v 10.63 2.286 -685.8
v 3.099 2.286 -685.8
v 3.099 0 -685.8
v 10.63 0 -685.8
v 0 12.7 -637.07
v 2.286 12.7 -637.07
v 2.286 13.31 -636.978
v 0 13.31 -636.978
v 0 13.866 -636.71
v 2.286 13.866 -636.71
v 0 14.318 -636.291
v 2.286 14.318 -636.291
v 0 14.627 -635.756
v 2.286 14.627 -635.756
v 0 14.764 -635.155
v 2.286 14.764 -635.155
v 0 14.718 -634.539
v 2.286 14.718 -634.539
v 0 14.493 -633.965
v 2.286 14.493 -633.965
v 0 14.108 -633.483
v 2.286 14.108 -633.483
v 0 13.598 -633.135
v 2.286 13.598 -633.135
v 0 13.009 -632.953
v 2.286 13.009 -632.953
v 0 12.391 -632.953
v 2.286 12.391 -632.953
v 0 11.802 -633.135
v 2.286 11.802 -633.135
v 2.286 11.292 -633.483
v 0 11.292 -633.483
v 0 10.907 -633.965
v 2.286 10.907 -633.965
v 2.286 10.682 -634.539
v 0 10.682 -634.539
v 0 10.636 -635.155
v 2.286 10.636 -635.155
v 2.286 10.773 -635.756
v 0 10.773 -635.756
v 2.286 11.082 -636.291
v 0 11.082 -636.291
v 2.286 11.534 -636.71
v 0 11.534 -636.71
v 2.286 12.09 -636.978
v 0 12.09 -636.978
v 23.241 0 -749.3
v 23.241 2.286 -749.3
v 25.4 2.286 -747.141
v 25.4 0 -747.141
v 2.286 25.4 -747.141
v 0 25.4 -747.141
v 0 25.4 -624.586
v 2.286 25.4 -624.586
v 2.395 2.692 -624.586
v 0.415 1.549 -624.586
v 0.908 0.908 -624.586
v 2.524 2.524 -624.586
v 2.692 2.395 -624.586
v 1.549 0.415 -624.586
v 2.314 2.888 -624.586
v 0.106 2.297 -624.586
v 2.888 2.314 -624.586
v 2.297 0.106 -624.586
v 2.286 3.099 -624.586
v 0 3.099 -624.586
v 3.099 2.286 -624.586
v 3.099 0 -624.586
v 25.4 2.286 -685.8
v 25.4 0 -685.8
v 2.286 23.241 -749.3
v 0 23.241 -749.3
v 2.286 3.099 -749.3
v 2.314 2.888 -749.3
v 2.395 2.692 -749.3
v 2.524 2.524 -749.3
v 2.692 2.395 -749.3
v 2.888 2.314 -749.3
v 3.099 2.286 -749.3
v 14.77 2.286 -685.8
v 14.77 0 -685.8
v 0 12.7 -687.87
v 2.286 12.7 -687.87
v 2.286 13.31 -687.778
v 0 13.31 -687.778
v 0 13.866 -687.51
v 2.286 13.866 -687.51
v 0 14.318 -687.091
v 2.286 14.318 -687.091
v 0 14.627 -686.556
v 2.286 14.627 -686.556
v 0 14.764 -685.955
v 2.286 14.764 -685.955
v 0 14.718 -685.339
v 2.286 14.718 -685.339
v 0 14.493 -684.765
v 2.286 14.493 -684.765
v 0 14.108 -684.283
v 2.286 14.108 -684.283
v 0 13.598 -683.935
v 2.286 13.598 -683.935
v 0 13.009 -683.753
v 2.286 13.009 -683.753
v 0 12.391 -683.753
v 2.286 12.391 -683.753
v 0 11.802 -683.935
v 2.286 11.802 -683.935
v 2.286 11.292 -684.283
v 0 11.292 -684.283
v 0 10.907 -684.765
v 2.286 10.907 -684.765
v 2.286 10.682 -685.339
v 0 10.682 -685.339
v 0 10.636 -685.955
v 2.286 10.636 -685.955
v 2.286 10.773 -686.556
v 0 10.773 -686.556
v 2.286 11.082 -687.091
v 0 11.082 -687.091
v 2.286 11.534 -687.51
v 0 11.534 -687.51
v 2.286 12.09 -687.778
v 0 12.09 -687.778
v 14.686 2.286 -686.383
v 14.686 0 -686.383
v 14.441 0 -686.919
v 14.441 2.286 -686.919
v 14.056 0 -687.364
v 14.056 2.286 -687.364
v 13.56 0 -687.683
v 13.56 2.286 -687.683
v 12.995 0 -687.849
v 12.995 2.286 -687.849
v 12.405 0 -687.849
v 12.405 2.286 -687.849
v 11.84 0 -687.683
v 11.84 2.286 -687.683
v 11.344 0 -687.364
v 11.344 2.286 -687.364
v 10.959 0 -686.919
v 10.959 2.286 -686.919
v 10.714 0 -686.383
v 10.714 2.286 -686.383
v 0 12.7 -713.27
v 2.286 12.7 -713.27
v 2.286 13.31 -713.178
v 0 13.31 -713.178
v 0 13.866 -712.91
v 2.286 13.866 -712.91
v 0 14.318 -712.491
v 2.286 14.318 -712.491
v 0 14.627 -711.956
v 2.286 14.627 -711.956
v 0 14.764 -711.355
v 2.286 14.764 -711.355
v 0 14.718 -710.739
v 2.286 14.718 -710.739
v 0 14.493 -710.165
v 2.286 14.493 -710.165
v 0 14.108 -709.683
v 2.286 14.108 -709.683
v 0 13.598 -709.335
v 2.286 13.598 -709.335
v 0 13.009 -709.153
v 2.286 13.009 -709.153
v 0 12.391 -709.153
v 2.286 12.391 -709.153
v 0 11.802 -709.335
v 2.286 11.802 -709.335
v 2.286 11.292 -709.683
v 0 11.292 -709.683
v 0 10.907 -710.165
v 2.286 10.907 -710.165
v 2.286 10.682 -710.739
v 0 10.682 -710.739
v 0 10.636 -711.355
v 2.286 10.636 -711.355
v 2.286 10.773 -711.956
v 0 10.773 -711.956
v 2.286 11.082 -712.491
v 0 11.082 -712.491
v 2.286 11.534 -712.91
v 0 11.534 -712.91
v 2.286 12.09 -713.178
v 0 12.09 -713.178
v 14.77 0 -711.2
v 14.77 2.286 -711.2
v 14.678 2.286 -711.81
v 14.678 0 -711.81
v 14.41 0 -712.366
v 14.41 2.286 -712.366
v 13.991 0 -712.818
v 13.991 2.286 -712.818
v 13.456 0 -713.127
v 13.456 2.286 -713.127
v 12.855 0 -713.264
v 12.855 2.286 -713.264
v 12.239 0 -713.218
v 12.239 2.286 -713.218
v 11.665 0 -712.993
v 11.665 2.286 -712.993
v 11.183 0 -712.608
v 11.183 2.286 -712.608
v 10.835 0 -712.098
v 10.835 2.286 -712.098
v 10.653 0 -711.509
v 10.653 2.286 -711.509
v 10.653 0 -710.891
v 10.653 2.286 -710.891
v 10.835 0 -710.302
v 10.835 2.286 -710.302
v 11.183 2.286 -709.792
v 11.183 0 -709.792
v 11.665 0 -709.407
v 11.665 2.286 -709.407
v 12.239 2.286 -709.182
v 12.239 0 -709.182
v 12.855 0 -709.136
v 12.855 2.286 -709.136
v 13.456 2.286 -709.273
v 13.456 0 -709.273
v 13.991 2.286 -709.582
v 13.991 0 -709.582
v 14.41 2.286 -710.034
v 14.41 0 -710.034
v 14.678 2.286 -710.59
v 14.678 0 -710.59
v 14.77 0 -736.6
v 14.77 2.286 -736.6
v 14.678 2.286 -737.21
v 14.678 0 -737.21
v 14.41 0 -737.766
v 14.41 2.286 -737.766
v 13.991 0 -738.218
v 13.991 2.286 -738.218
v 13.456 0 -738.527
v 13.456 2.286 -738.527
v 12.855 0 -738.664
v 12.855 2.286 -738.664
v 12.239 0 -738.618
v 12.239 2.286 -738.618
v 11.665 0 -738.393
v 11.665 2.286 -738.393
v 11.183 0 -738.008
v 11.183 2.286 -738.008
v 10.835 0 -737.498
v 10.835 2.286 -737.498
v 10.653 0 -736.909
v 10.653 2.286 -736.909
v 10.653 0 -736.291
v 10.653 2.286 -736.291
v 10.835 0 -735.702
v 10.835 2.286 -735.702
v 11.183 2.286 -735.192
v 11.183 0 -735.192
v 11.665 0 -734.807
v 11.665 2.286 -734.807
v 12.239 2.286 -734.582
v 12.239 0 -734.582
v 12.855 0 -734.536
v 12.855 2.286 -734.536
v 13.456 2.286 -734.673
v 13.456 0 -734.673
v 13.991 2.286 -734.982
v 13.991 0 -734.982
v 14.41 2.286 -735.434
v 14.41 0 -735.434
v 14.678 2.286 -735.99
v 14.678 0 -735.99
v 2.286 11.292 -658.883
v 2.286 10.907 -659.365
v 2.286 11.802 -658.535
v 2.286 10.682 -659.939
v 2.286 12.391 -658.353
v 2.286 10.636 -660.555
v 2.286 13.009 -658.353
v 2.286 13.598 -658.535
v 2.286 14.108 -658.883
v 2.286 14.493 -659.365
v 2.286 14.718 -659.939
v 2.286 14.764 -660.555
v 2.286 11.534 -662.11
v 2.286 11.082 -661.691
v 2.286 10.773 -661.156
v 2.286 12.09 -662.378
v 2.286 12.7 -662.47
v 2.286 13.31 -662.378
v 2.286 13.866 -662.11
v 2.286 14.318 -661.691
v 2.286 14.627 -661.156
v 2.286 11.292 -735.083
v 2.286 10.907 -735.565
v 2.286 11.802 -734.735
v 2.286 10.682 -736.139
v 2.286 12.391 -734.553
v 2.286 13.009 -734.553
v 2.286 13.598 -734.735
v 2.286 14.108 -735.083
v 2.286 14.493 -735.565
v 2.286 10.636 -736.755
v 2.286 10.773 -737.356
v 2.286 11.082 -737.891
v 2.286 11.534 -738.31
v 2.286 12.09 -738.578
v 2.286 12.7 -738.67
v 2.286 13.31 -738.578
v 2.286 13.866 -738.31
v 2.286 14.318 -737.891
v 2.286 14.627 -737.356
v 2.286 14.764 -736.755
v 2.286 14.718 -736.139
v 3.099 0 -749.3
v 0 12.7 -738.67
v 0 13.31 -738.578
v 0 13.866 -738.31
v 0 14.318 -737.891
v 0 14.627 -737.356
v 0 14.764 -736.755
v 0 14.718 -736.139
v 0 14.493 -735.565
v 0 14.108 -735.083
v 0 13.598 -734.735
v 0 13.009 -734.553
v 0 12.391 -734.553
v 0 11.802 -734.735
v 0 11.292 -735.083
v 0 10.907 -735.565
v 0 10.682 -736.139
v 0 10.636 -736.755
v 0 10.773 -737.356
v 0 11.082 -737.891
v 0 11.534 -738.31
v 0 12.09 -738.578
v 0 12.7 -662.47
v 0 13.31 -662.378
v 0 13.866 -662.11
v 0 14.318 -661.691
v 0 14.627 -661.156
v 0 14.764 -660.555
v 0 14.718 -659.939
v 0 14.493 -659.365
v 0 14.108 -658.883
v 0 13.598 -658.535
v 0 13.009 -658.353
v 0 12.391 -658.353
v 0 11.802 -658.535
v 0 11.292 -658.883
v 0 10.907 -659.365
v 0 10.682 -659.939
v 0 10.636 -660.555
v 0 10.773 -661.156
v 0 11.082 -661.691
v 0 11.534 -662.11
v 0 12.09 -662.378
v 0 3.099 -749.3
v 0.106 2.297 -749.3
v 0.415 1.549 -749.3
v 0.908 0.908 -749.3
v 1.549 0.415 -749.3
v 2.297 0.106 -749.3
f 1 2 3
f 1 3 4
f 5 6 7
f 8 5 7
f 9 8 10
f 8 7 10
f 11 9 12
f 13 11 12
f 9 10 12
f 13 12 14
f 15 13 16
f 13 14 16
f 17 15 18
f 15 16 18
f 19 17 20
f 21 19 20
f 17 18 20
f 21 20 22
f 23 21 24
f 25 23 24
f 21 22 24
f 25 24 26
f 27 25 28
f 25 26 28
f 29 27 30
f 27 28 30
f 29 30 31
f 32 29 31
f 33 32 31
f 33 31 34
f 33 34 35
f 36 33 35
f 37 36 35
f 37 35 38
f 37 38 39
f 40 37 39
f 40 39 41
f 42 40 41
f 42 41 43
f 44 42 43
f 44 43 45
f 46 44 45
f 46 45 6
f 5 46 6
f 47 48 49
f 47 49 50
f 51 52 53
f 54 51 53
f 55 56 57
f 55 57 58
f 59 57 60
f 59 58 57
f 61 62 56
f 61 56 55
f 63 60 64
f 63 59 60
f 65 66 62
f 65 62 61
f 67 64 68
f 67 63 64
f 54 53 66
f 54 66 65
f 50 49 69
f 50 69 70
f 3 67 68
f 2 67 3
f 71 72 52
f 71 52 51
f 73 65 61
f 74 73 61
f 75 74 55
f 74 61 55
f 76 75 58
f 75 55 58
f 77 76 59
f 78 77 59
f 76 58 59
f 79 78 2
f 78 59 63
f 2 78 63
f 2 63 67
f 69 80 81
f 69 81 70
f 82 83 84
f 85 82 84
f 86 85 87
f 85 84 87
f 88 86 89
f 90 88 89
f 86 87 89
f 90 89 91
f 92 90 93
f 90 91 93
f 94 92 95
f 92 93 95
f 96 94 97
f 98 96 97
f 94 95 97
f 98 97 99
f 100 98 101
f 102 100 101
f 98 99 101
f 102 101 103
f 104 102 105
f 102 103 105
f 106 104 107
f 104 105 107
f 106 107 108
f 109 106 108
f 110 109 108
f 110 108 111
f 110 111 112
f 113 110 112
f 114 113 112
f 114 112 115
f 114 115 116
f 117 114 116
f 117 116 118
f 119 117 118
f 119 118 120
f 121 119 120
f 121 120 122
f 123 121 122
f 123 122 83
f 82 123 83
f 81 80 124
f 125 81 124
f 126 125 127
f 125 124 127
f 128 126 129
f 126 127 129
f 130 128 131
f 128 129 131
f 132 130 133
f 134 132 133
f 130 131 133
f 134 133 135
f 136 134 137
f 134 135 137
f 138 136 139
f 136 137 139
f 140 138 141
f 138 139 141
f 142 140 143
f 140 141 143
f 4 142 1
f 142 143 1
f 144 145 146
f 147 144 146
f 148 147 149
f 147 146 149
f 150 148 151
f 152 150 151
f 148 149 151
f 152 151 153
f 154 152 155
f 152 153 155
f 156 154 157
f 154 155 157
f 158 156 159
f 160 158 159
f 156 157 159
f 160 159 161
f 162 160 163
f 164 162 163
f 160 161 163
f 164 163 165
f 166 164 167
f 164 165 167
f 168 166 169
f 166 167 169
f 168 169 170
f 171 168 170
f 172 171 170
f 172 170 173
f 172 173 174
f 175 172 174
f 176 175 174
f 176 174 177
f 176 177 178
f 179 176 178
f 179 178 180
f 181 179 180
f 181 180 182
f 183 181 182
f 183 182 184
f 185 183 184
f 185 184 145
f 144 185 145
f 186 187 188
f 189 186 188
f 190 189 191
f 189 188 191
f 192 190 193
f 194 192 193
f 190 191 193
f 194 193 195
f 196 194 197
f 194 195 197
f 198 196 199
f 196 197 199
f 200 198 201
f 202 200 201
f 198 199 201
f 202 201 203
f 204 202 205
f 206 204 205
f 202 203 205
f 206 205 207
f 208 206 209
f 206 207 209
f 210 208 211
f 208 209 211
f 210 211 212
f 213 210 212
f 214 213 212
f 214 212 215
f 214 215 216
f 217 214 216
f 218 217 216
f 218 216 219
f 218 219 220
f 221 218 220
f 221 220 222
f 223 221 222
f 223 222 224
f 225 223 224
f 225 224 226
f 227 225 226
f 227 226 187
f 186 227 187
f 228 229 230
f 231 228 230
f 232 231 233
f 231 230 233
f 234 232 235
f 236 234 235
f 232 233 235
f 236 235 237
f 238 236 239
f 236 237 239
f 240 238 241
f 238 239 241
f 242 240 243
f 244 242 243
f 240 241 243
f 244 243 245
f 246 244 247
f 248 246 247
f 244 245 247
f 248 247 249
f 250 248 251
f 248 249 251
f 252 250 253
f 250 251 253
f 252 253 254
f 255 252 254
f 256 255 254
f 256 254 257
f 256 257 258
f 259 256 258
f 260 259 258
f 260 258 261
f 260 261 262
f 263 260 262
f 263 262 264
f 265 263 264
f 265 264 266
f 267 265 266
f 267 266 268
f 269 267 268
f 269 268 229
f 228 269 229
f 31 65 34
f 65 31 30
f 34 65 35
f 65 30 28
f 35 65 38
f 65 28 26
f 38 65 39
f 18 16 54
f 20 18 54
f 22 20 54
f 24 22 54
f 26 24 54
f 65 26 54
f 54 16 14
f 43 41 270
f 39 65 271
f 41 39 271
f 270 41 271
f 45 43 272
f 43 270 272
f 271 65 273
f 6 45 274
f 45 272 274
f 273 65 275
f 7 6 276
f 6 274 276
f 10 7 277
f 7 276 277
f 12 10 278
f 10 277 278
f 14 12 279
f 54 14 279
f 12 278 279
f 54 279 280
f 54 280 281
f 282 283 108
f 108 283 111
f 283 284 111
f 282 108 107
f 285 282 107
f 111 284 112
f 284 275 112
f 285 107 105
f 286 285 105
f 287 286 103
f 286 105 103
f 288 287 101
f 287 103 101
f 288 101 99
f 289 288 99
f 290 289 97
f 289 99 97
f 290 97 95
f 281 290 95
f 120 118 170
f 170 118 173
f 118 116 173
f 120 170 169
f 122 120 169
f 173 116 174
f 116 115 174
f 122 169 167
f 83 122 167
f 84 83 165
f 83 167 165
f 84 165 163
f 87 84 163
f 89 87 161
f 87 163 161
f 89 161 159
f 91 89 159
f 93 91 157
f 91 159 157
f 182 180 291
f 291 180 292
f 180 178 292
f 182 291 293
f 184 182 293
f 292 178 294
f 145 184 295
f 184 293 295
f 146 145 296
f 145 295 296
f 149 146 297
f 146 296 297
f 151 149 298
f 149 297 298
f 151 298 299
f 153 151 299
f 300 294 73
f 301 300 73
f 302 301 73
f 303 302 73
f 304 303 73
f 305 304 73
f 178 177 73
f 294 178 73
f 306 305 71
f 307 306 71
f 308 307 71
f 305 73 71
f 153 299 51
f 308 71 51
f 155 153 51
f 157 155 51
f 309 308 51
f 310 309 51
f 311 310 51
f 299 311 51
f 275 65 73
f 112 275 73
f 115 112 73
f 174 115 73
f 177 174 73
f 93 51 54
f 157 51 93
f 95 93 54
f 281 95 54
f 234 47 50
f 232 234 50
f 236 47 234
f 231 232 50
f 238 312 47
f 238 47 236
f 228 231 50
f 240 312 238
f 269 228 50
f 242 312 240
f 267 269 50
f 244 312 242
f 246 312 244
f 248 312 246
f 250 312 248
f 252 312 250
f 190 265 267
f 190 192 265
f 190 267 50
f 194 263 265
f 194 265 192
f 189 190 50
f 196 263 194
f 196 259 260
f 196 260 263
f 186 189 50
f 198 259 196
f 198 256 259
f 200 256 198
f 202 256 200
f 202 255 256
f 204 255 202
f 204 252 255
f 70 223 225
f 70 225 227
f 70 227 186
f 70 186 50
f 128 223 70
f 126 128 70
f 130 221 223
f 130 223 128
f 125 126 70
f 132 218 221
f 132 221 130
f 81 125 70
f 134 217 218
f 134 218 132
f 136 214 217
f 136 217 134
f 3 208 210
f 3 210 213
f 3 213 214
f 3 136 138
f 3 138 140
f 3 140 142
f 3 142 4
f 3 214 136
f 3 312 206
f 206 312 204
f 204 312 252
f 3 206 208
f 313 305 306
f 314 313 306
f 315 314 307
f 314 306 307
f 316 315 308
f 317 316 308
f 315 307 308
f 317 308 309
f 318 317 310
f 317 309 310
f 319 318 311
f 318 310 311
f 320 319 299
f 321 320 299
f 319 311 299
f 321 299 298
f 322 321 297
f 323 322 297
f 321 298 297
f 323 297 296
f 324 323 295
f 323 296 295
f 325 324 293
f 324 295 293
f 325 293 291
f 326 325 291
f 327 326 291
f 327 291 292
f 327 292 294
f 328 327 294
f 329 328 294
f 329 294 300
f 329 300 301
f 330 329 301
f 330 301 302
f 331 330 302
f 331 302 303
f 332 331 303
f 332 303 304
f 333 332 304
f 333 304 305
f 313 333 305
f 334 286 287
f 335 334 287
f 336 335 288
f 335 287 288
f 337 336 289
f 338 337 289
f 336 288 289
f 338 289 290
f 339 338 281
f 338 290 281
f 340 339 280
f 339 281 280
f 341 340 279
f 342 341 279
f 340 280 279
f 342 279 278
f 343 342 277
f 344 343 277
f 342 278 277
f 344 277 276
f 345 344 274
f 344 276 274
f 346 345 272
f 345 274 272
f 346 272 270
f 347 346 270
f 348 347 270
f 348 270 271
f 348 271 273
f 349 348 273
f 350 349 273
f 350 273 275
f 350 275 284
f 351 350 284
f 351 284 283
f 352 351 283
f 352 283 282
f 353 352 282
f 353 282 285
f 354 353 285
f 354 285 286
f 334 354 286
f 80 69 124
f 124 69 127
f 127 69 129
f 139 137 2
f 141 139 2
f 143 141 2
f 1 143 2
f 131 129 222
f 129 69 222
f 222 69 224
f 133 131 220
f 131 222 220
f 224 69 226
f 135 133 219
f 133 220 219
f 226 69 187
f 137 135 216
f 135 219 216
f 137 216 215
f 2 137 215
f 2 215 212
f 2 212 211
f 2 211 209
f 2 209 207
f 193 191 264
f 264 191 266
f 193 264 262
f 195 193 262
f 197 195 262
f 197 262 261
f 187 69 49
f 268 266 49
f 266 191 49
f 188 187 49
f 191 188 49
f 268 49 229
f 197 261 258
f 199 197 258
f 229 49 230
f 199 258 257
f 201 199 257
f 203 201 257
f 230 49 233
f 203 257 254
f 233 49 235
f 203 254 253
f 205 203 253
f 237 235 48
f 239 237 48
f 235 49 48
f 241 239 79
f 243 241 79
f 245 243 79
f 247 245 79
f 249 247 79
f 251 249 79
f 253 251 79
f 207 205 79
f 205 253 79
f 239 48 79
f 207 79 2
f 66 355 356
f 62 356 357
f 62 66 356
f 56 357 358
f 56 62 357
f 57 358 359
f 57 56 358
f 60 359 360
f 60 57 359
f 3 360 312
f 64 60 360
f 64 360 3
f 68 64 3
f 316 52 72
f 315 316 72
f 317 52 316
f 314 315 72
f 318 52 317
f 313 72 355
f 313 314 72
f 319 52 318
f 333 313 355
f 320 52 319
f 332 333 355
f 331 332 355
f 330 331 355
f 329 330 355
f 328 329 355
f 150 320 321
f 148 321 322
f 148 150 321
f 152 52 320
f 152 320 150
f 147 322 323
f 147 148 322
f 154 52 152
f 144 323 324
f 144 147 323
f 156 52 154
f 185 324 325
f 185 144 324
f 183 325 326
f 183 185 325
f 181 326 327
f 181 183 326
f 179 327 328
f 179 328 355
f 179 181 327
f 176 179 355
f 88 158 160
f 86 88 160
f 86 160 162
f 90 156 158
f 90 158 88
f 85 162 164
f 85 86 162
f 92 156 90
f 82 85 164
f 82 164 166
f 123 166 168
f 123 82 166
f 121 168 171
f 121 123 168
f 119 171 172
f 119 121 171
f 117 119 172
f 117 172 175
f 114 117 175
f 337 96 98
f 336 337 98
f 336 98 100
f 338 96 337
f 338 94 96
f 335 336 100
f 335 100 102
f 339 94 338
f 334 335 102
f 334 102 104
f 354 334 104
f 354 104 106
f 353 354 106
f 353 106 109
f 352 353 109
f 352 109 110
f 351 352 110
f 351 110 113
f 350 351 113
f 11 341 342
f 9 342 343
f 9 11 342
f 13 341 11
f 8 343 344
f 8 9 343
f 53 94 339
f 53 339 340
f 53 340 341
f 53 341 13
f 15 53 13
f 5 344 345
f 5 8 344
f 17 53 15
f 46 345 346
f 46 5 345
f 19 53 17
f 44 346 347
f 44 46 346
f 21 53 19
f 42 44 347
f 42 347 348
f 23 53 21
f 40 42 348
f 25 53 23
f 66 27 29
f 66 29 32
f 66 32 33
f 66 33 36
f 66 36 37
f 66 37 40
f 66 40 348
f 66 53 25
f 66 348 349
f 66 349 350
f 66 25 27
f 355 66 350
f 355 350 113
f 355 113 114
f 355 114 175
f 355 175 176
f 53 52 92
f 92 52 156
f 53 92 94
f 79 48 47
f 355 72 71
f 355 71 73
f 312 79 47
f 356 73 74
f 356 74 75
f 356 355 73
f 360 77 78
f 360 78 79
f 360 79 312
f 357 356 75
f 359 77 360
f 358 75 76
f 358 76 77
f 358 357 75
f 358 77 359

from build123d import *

# Parameters (mm, degrees)
SKETCH1_W                  = 25.4
SKETCH1_H                  = 1498.6
BOSS_EXTRUDE1_DEPTH        = 25.4
SKETCH2_W                  = 23.114
SKETCH2_H                  = 23.114
CUT_EXTRUDE1_DEPTH         = 1499.6
M3_5_CLEARANCE_HOLE1_D     = 4.1402
M3_5_CLEARANCE_HOLE1_DEPTH = 25.4
M3_5_CLEARANCE_HOLE2_D     = 4.1402
M3_5_CLEARANCE_HOLE2_DEPTH = 25.4
CHAMFER1_SIZE              = 2.159
FILLET1_R                  = 0.8128
FILLET2_R                  = 3.0988
SKETCH8_W                  = 95.882963774
SKETCH8_H                  = 79.338329604
CUT_EXTRUDE3_DEPTH         = 1371.6
SKETCH11_W                 = 51.462522779
SKETCH11_H                 = 66.676735099
CUT_EXTRUDE6_DEPTH         = 2.286
SKETCH12_W                 = 22.3012
SKETCH12_H                 = 61.214
CUT_EXTRUDE7_DEPTH         = 2.54


with BuildPart() as part:
    # Sketch1 → Boss-Extrude1 (new body)
    with BuildSketch(Plane(origin=(0, 0, 0), x_dir=(0, -1, 0), z_dir=(-1, 0, 0))):
        with Locations((-12.7, 0)):
            Rectangle(SKETCH1_W, SKETCH1_H)
    extrude(amount=-BOSS_EXTRUDE1_DEPTH)

    # Sketch2 → Cut-Extrude1 (cut, through all)
    with BuildSketch(Plane(origin=(0, 0, -749.3), x_dir=(-1, 0, 0), z_dir=(0, 0, -1))):
        with Locations((-13.843, 13.843)):
            Rectangle(SKETCH2_W, SKETCH2_H)
    extrude(amount=-CUT_EXTRUDE1_DEPTH, mode=Mode.SUBTRACT)

    # M3.5 Clearance Hole1
    with Locations(Plane(origin=(0, 0, 0), x_dir=(-1, 0, 0), z_dir=(0, -1, 0))):
        with Locations((-12.7, 736.6), (-12.7, 711.2), (-12.7, 685.8), (-12.7, 660.4), (-12.7, 635), (-12.7, 609.6), (-12.7, 584.2), (-12.7, 558.8), (-12.7, 533.4), (-12.7, 508), (-12.7, 482.6), (-12.7, 457.2), (-12.7, 431.8), (-12.7, 406.4), (-12.7, 381), (-12.7, 355.6), (-12.7, 330.2), (-12.7, 304.8), (-12.7, 279.4), (-12.7, 254), (-12.7, 228.6), (-12.7, 203.2), (-12.7, 177.8), (-12.7, 152.4), (-12.7, 127), (-12.7, 101.6), (-12.7, 76.2), (-12.7, 50.8), (-12.7, 25.4), (-12.7, 0), (-12.7, -25.4), (-12.7, -50.8), (-12.7, -76.2), (-12.7, -101.6), (-12.7, -127), (-12.7, -152.4), (-12.7, -177.8), (-12.7, -203.2), (-12.7, -228.6), (-12.7, -254), (-12.7, -279.4), (-12.7, -304.8), (-12.7, -330.2), (-12.7, -355.6), (-12.7, -381), (-12.7, -406.4), (-12.7, -431.8), (-12.7, -457.2), (-12.7, -482.6), (-12.7, -508), (-12.7, -533.4), (-12.7, -558.8), (-12.7, -584.2), (-12.7, -609.6), (-12.7, -635), (-12.7, -660.4), (-12.7, -685.8), (-12.7, -711.2), (-12.7, -736.6)):
            Hole(M3_5_CLEARANCE_HOLE1_D / 2, depth=M3_5_CLEARANCE_HOLE1_DEPTH)

    # M3.5 Clearance Hole2
    with Locations(Plane.ZY):
        with Locations((711.2, 12.7), (736.6, 12.7), (685.8, 12.7), (660.4, 12.7), (635, 12.7), (609.6, 12.7), (584.2, 12.7), (558.8, 12.7), (533.4, 12.7), (508, 12.7), (482.6, 12.7), (457.2, 12.7), (431.8, 12.7), (406.4, 12.7), (381, 12.7), (355.6, 12.7), (330.2, 12.7), (304.8, 12.7), (279.4, 12.7), (254, 12.7), (228.6, 12.7), (203.2, 12.7), (177.8, 12.7), (152.4, 12.7), (127, 12.7), (101.6, 12.7), (76.2, 12.7), (50.8, 12.7), (25.4, 12.7), (0, 12.7), (-25.4, 12.7), (-50.8, 12.7), (-76.2, 12.7), (-101.6, 12.7), (-127, 12.7), (-152.4, 12.7), (-177.8, 12.7), (-203.2, 12.7), (-228.6, 12.7), (-254, 12.7), (-279.4, 12.7), (-304.8, 12.7), (-330.2, 12.7), (-355.6, 12.7), (-381, 12.7), (-406.4, 12.7), (-431.8, 12.7), (-457.2, 12.7), (-482.6, 12.7), (-508, 12.7), (-533.4, 12.7), (-558.8, 12.7), (-584.2, 12.7), (-609.6, 12.7), (-635, 12.7), (-660.4, 12.7), (-685.8, 12.7), (-711.2, 12.7), (-736.6, 12.7)):
            Hole(M3_5_CLEARANCE_HOLE2_D / 2, depth=M3_5_CLEARANCE_HOLE2_DEPTH)

    # Chamfer1
    chamfer1_edges = [part.edges().sort_by_distance(p)[0] for p in [
        (25.4, 1.143, -749.3),
        (1.143, 25.4, 749.3),
        (1.143, 25.4, -749.3),
        (25.4, 1.143, 749.3),
    ]]
    chamfer(chamfer1_edges, length=CHAMFER1_SIZE)

    # Fillet1
    fillet1_edges = [part.edges().sort_by_distance(p)[0] for p in [
        (2.286, 2.286, 0),
    ]]
    fillet(fillet1_edges, radius=FILLET1_R)

    # Fillet2
    fillet2_edges = [part.edges().sort_by_distance(p)[0] for p in [
        (0, 0, 0),
    ]]
    fillet(fillet2_edges, radius=FILLET2_R)

    # Sketch8 → Cut-Extrude3 (cut)
    with BuildSketch(Plane.XY.offset(749.3)):
        with Locations((2.286, 3.0988)):
            Rectangle(SKETCH8_W, SKETCH8_H)
    extrude(amount=-CUT_EXTRUDE3_DEPTH, mode=Mode.SUBTRACT)

    # Sketch11 → Cut-Extrude6 (cut)
    with BuildSketch(Plane.XY.offset(-622.3)):
        with Locations((1.85517497, 1.74884985)):
            Rectangle(SKETCH11_W, SKETCH11_H)
    extrude(amount=-CUT_EXTRUDE6_DEPTH, mode=Mode.SUBTRACT)

    # Sketch12 → Cut-Extrude7 (cut)
    with BuildSketch(Plane(origin=(0, 2.286, 0), x_dir=(1, 0, 0), z_dir=(0, 1, 0))):
        with Locations((14.2494, 655.193)):
            Rectangle(SKETCH12_W, SKETCH12_H)
    extrude(amount=-CUT_EXTRUDE7_DEPTH, mode=Mode.SUBTRACT)


solid = part.part
